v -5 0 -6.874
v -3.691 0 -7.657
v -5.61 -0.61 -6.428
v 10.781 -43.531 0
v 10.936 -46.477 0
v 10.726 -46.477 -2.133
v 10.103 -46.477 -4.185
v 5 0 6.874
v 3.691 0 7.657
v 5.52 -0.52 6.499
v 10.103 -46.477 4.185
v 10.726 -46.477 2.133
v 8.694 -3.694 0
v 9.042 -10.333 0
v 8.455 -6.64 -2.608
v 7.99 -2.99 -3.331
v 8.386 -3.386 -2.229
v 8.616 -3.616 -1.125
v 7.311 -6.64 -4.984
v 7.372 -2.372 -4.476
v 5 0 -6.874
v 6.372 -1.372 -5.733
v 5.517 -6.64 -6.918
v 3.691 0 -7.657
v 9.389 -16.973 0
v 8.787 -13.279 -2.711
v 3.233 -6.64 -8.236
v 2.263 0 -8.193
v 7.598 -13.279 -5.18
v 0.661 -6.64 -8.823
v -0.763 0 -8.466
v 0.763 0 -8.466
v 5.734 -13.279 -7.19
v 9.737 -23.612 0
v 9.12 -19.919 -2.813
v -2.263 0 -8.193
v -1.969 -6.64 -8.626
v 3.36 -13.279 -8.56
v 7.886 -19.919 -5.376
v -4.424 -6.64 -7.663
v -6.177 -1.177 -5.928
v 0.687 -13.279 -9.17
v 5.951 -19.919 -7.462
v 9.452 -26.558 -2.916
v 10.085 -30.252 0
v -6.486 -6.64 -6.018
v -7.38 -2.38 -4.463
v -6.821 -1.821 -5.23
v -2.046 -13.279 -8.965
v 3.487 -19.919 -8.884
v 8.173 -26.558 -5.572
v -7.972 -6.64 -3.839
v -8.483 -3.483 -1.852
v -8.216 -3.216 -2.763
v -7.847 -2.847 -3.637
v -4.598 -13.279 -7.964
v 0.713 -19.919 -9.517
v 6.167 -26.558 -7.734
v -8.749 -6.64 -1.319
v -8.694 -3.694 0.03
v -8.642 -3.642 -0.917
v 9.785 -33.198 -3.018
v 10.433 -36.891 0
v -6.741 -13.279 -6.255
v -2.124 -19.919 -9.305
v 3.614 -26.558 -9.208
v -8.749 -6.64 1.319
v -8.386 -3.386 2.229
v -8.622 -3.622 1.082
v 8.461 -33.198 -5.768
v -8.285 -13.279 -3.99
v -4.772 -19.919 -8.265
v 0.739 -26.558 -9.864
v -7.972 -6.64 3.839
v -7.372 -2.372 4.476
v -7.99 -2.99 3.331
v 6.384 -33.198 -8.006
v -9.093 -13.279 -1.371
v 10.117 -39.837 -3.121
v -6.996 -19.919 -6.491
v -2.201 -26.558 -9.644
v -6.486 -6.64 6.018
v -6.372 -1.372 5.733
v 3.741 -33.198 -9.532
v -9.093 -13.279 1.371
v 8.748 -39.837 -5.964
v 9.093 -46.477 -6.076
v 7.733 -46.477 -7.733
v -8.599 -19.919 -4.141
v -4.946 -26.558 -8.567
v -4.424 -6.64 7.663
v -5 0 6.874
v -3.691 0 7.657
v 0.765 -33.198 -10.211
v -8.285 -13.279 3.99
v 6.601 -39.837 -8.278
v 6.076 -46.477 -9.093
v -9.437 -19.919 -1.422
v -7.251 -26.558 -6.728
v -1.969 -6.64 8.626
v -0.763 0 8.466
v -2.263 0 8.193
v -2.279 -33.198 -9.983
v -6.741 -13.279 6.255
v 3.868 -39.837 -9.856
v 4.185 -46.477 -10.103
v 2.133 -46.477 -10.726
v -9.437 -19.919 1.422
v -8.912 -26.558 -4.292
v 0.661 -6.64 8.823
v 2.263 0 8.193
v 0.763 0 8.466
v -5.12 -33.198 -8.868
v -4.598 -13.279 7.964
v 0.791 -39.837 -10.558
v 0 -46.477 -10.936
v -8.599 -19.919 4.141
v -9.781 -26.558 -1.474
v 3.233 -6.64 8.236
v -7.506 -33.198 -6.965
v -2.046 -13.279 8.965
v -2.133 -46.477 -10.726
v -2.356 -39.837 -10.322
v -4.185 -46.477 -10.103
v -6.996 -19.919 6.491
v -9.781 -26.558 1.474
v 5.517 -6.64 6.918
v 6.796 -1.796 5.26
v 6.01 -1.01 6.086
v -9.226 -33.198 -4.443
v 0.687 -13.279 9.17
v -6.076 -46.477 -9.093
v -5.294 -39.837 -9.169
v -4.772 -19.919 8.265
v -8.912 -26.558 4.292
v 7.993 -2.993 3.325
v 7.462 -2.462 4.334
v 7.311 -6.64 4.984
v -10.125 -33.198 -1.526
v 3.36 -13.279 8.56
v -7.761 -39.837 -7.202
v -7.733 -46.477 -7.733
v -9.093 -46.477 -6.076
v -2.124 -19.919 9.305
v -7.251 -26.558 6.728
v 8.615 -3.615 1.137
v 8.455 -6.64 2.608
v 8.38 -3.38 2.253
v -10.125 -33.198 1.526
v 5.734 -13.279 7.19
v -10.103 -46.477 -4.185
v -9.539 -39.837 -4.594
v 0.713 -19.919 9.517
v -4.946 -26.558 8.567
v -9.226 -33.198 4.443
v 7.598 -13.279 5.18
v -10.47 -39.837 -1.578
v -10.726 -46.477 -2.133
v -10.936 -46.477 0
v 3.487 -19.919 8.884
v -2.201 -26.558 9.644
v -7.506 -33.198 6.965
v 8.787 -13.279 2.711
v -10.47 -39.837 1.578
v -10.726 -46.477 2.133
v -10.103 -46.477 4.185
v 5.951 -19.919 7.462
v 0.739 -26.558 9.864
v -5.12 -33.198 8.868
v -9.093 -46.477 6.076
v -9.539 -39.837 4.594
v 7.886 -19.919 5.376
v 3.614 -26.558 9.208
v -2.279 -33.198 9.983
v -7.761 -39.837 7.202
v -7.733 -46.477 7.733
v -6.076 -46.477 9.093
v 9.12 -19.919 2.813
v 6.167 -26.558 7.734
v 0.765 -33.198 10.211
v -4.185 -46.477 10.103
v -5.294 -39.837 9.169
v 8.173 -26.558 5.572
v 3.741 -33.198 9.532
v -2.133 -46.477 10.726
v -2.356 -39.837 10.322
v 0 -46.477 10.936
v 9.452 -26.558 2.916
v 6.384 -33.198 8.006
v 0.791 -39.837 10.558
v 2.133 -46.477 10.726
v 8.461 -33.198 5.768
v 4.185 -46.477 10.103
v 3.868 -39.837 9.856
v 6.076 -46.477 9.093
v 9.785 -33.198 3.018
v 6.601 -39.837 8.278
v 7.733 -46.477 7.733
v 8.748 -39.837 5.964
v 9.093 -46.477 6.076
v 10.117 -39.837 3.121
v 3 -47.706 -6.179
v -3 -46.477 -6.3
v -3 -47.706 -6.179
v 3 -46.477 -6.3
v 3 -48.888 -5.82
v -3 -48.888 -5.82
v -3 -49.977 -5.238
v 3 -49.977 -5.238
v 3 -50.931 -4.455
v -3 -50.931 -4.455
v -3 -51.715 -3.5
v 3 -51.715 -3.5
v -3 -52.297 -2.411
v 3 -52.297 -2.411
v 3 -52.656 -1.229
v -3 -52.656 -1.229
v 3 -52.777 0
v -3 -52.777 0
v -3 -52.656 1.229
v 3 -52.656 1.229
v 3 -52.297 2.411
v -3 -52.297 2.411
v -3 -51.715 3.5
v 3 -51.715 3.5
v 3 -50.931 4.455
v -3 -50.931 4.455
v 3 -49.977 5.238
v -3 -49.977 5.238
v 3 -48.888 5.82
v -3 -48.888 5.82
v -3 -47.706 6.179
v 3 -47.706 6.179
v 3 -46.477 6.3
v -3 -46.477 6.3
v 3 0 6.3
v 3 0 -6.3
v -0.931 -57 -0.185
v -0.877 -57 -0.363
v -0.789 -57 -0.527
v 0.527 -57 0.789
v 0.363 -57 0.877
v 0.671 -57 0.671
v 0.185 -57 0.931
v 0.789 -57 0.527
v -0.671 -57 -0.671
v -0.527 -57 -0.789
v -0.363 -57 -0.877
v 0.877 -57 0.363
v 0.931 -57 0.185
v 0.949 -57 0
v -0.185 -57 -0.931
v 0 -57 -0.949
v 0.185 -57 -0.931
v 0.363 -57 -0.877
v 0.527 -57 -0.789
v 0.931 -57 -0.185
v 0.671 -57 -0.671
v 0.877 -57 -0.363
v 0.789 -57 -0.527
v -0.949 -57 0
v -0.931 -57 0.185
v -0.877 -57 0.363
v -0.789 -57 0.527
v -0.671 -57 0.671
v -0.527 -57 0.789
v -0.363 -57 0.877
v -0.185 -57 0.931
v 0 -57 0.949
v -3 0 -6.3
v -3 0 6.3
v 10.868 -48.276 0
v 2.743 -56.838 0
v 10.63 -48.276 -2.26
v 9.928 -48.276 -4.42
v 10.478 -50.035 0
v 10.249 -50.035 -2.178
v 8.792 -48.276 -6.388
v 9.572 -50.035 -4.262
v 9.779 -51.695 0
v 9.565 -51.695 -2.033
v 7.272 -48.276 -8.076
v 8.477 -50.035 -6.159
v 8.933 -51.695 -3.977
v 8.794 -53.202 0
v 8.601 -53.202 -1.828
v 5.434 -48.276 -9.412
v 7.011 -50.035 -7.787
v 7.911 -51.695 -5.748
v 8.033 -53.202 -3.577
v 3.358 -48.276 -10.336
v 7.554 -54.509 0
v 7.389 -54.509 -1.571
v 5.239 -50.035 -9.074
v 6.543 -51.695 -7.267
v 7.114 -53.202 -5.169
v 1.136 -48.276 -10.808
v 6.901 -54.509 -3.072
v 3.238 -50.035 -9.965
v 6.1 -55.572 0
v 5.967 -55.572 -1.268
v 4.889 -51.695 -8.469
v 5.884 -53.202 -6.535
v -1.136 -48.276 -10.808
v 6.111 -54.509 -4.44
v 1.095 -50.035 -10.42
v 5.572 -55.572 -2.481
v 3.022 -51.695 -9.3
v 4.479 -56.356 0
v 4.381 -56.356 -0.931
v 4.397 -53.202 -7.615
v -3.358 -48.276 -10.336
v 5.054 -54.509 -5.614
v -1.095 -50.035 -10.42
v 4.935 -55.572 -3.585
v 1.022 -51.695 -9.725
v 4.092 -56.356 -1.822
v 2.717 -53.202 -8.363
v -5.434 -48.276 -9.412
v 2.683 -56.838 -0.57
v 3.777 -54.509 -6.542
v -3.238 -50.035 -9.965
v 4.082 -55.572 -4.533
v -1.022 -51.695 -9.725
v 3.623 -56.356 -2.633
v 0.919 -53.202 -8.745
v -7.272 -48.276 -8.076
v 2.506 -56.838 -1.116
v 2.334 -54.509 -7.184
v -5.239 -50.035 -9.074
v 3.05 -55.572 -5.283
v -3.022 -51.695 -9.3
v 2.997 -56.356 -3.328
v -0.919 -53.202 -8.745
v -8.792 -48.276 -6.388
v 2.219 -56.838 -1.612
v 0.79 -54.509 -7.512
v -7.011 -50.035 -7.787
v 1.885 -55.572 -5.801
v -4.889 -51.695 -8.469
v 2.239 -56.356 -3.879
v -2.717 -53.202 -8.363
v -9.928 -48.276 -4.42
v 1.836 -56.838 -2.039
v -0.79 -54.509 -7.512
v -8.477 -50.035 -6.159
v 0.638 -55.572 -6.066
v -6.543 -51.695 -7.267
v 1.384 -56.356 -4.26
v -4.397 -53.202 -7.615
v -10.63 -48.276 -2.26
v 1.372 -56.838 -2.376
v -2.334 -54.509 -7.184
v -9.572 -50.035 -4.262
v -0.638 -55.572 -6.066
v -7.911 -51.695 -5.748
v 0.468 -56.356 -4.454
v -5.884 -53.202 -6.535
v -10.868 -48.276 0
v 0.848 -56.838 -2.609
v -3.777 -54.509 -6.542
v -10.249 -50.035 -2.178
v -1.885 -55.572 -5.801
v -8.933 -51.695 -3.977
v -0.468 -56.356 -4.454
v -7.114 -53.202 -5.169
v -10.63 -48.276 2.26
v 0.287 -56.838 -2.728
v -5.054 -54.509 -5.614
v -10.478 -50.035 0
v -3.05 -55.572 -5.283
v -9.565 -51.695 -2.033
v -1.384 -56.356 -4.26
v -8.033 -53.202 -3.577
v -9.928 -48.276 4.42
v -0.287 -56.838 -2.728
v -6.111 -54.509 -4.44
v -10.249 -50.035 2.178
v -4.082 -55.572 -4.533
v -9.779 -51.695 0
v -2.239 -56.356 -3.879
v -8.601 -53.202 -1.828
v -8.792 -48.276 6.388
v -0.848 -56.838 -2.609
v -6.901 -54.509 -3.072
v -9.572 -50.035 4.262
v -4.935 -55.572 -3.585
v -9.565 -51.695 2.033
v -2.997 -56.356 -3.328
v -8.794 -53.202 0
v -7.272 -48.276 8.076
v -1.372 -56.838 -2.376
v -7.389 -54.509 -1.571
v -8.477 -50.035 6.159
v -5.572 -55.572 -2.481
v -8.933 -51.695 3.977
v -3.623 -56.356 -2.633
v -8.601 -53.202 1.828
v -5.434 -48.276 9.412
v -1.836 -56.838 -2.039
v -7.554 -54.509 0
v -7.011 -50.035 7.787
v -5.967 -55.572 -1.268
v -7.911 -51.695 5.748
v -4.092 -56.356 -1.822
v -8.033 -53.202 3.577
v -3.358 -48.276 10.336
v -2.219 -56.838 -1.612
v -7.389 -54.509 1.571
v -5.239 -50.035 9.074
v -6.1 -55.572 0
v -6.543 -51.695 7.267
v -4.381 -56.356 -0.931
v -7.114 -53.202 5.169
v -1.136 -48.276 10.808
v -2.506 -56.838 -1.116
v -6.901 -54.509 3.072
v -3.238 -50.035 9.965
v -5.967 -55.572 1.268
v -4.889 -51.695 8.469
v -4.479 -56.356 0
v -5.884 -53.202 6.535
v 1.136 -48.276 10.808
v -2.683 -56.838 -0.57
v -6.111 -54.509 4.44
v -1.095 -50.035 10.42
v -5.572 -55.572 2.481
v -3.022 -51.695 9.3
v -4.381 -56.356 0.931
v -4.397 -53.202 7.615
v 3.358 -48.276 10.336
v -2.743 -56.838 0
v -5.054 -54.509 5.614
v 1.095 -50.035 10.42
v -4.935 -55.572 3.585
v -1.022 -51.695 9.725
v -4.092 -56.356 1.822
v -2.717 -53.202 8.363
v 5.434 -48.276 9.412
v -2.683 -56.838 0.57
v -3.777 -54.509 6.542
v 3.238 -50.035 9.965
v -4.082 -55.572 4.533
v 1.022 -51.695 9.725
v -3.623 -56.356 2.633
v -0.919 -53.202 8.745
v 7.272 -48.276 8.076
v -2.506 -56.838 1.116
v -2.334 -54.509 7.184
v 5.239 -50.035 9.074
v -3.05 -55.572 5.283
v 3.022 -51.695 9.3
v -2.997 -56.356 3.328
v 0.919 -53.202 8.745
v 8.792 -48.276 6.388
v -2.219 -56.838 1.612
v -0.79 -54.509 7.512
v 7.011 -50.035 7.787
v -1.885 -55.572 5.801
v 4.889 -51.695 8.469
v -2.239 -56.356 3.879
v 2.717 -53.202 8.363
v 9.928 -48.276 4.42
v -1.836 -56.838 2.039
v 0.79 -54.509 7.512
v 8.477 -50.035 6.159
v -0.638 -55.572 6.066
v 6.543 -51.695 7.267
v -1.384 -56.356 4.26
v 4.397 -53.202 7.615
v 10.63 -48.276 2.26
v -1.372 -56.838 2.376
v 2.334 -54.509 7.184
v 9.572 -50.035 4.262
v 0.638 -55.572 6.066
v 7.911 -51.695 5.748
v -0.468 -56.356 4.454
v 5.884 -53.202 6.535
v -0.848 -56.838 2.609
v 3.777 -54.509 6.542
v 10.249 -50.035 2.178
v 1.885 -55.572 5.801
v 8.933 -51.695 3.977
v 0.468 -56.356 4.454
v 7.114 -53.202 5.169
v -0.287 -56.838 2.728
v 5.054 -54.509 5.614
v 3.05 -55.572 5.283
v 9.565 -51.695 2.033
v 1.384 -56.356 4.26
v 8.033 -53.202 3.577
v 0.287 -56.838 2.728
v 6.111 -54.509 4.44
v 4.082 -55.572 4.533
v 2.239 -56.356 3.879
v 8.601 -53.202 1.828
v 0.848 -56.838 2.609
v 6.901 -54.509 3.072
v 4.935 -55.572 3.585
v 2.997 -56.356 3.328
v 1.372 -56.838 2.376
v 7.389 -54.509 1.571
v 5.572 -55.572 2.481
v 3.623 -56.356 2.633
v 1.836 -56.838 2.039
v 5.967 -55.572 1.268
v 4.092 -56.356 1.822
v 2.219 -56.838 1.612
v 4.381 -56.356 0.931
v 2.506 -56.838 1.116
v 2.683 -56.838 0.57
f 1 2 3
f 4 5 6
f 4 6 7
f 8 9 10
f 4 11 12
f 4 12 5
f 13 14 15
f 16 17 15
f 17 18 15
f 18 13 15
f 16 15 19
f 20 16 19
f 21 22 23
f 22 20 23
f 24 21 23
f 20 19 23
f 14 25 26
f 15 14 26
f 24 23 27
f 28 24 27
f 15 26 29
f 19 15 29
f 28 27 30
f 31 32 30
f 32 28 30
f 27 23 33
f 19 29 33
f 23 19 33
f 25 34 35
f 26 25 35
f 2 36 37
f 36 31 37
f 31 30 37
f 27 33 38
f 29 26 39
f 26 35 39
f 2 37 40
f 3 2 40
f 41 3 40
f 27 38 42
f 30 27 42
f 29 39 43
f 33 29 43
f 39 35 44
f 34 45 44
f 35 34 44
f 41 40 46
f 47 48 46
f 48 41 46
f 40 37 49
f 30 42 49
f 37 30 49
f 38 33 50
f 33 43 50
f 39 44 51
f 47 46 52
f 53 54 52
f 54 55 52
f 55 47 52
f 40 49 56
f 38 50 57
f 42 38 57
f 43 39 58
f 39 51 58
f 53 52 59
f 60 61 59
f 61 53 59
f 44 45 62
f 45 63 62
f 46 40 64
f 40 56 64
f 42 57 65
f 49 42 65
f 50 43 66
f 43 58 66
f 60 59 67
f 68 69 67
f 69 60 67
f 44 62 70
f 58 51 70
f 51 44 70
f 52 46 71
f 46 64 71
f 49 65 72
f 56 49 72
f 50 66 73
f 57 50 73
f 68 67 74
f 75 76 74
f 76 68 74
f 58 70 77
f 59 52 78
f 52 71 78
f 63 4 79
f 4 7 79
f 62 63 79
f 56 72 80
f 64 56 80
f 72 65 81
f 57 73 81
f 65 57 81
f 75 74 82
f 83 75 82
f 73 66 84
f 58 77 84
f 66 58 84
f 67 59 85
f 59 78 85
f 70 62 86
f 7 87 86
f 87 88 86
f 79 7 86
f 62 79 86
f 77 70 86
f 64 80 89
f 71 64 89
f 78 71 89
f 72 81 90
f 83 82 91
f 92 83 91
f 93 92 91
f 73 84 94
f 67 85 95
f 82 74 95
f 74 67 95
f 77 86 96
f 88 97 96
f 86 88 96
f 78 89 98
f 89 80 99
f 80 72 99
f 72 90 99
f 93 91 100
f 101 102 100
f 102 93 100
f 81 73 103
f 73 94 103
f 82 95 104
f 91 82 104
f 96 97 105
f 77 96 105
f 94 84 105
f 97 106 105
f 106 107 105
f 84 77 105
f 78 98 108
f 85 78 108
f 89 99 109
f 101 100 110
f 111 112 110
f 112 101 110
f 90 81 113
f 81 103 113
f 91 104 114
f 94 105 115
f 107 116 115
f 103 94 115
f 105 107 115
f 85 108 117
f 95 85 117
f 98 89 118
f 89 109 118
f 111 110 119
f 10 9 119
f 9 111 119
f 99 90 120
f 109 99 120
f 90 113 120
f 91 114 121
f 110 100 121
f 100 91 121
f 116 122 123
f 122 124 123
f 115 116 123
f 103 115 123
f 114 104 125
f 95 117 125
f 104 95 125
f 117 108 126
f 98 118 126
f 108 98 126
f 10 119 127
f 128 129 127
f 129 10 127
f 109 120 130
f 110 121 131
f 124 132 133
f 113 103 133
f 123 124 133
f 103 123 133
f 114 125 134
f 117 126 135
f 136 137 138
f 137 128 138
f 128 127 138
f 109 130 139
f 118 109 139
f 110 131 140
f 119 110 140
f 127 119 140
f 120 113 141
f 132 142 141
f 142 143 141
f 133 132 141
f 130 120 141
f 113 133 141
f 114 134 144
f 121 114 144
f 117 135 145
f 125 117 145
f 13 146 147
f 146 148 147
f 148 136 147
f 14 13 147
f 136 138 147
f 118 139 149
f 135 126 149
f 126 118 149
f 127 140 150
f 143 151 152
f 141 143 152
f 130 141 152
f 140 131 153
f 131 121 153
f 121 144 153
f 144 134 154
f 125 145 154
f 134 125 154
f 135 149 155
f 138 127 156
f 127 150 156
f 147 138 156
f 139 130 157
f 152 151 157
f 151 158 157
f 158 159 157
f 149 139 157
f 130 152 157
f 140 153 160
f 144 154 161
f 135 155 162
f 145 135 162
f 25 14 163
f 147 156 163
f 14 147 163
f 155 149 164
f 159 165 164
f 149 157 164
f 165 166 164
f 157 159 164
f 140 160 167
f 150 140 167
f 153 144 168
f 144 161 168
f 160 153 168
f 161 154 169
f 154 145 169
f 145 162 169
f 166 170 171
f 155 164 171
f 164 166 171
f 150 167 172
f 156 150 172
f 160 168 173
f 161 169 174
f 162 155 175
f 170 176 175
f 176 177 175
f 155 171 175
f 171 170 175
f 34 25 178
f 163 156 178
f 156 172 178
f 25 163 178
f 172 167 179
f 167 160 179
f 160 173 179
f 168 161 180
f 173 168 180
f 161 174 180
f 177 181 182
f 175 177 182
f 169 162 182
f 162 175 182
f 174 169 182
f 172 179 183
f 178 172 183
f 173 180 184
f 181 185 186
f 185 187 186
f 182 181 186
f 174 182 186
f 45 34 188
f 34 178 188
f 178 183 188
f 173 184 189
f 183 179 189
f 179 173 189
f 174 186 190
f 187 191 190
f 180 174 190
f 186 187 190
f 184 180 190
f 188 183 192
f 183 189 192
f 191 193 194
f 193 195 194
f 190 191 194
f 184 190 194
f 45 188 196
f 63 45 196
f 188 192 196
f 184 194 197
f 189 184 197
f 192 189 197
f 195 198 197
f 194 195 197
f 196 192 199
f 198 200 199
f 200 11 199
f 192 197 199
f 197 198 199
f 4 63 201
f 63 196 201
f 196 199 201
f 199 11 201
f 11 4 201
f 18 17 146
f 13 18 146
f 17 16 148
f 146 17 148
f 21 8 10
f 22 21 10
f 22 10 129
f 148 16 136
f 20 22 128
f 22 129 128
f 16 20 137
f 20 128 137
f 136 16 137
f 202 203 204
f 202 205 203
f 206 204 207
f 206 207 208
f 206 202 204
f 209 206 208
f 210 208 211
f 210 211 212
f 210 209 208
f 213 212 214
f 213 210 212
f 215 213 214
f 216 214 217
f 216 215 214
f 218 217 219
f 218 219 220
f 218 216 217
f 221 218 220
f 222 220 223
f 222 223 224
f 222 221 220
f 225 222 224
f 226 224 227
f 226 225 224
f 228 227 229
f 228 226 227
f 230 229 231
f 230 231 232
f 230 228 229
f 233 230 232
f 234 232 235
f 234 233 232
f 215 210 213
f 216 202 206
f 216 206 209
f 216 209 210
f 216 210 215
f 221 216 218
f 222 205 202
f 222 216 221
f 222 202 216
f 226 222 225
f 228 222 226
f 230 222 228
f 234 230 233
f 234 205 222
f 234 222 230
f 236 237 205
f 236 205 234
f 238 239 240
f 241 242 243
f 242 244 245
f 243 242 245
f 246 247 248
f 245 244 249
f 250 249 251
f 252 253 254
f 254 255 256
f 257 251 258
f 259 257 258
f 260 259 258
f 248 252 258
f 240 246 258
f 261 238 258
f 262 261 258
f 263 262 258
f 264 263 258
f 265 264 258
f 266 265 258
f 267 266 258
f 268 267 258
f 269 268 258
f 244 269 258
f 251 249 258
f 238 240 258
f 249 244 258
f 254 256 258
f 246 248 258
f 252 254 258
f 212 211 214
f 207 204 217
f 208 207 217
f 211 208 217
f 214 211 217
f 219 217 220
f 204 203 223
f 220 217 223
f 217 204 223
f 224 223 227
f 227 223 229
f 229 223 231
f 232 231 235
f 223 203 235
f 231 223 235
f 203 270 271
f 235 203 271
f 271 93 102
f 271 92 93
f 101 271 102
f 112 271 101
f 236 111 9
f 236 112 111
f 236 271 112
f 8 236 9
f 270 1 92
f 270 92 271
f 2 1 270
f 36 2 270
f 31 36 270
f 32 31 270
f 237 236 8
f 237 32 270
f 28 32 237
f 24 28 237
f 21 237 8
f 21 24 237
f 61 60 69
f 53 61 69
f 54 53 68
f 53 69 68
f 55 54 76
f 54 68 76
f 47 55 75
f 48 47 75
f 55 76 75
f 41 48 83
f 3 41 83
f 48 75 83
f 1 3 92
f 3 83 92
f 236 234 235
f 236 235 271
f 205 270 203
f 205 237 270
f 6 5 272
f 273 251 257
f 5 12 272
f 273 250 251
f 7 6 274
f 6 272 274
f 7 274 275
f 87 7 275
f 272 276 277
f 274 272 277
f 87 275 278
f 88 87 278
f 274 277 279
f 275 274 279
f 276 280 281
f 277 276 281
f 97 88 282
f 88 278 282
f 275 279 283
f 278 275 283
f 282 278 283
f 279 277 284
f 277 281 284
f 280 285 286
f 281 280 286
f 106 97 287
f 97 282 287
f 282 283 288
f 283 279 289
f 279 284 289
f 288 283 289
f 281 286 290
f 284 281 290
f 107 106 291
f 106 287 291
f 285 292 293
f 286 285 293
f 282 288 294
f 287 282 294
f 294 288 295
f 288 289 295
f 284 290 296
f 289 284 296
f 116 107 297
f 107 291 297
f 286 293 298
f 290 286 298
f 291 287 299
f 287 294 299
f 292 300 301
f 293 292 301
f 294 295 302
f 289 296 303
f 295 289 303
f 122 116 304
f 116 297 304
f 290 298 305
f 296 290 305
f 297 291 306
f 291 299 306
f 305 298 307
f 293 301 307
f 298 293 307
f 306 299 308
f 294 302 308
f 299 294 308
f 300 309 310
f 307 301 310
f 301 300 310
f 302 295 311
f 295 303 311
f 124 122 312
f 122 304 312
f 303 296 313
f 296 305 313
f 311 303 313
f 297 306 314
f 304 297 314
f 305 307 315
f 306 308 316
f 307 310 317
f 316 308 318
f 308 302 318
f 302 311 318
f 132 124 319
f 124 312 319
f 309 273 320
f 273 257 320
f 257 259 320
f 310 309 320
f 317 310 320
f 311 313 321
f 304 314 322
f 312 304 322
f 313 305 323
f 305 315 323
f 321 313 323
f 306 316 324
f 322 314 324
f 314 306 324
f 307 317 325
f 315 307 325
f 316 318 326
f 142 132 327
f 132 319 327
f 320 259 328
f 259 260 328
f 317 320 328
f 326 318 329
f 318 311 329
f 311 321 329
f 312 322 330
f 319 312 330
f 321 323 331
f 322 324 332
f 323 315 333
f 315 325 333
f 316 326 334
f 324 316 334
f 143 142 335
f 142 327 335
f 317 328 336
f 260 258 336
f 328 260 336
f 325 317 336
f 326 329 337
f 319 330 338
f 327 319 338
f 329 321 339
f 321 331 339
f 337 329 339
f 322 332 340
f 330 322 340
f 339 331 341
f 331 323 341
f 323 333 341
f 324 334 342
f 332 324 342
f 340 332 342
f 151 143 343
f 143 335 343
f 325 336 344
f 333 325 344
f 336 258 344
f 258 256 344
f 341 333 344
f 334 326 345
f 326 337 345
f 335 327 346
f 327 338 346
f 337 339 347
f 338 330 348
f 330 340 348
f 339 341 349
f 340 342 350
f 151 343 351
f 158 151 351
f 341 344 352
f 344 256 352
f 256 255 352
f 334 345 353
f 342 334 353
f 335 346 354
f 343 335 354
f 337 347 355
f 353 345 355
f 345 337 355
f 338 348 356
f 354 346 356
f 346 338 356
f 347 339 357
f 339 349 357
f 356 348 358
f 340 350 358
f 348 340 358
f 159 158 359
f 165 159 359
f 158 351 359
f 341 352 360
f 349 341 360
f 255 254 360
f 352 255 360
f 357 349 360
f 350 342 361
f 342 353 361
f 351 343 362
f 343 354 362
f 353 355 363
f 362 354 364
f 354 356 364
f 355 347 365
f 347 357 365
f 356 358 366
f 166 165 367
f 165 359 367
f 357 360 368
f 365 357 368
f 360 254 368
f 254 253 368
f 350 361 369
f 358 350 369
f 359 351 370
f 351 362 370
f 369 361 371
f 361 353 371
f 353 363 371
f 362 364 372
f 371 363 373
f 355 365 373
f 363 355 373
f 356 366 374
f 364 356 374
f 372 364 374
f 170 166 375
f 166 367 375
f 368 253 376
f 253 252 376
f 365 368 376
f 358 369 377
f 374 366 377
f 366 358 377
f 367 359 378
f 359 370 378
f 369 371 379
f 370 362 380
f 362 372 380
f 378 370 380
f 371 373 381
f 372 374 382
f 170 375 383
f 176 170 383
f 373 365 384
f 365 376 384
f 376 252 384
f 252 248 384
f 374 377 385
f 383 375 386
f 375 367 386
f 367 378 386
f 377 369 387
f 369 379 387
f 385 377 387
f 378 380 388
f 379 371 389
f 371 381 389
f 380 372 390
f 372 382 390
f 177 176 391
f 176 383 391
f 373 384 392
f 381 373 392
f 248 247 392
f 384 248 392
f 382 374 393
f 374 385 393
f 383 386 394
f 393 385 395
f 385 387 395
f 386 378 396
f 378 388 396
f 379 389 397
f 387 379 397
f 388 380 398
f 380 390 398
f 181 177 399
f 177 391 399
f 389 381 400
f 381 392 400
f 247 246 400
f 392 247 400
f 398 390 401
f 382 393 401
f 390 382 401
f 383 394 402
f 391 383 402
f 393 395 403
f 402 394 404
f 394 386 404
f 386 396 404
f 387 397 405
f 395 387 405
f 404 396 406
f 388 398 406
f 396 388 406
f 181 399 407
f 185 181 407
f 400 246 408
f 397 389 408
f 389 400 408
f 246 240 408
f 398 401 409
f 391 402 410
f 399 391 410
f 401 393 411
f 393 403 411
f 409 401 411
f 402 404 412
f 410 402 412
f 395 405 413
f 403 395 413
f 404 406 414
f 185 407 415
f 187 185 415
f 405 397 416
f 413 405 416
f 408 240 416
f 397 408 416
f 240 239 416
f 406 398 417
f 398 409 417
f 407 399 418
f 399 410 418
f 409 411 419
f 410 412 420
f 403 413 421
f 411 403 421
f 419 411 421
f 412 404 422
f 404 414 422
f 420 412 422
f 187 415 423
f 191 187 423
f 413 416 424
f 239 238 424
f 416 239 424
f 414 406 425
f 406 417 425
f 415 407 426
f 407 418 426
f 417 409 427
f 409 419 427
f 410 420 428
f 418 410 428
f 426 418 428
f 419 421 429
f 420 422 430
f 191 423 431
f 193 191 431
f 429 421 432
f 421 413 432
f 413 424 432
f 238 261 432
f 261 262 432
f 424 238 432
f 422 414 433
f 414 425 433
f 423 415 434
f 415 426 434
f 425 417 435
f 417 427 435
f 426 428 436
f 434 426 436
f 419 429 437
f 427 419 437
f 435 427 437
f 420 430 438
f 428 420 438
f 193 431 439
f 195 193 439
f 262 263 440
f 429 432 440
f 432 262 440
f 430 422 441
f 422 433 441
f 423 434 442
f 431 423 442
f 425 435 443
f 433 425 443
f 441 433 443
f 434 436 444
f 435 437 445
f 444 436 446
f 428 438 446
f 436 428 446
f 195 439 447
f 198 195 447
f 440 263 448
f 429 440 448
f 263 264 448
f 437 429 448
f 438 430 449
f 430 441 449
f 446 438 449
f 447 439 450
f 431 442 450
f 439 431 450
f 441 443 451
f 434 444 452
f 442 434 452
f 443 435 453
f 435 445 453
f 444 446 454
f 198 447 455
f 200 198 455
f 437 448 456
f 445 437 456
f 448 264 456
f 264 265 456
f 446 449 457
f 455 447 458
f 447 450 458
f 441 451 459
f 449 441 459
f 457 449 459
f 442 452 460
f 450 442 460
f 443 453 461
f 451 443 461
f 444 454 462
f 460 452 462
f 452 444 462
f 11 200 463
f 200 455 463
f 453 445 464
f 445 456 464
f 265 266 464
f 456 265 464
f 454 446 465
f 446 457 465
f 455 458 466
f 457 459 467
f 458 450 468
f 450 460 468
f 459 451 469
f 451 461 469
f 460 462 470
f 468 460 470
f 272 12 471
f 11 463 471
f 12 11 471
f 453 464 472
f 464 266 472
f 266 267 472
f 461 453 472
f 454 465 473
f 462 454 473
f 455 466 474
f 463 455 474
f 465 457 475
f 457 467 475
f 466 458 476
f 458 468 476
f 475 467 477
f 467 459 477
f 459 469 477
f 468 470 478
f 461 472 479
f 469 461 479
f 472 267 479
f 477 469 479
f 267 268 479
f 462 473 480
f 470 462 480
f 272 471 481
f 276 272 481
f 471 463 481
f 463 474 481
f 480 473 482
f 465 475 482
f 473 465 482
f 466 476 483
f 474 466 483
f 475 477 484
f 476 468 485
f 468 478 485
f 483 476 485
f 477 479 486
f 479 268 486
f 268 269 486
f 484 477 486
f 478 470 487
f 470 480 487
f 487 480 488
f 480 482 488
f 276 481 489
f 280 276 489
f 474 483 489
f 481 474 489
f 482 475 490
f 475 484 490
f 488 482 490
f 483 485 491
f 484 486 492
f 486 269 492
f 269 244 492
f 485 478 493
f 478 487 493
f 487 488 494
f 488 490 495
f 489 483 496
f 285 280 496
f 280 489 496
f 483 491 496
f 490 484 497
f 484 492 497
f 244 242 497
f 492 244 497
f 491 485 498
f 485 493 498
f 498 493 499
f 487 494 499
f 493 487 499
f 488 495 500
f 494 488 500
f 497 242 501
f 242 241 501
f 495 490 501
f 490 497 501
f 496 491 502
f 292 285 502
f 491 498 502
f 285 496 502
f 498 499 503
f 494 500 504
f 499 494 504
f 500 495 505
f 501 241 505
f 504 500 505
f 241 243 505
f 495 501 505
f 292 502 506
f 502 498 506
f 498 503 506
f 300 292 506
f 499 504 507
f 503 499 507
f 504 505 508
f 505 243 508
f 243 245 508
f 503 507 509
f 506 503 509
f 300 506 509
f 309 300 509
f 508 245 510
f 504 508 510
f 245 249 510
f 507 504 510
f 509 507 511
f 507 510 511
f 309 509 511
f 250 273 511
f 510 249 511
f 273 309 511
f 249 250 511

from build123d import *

# Parameters (mm, degrees)
SKETCH1_R           = 8.5
BOSS_EXTRUDE1_DEPTH = 57
BOSS_EXTRUDE1_TAPER = -3
FILLET1_R           = 10
CUT_EXTRUDE1_DEPTH  = 3
CUT_EXTRUDE2_DEPTH  = 23


with BuildPart() as part:
    # Sketch1 → Boss-Extrude1 (new body)
    with BuildSketch(Plane(origin=(0, 0, 0), x_dir=(1, 0, 0), z_dir=(0, 1, 0))):
        Circle(SKETCH1_R)
    extrude(amount=-BOSS_EXTRUDE1_DEPTH, taper=BOSS_EXTRUDE1_TAPER)

    # Fillet1
    fillet1_edges = [part.edges().sort_by_distance(p)[0] for p in [
        (-11.487243419, -57, 0),
    ]]
    fillet(fillet1_edges, radius=FILLET1_R)

    # Sketch2 → Cut-Extrude1 (cut, symmetric)
    with BuildSketch(Plane(origin=(0, 0, 0), x_dir=(0, 0, -1), z_dir=(1, 0, 0))):
        with BuildLine():
            Line((-6.3, 0), (6.3, 0))
            Line((6.3, 0), (6.3, -46.476640438))
            ThreePointArc((6.3, -46.476640438), (0, -52.776640438), (-6.3, -46.476640438))
            Line((-6.3, -46.476640438), (-6.3, 0))
        make_face()
    extrude(amount=CUT_EXTRUDE1_DEPTH, both=True, mode=Mode.SUBTRACT)

    # Sketch3 → Cut-Extrude2 (cut, symmetric)
    with BuildSketch(Plane.XY):
        Polygon((-5, 0), (5, 0), (10, -5), (10, 5), (-10, 5), (-10, -5), align=None)
    extrude(amount=CUT_EXTRUDE2_DEPTH, both=True, mode=Mode.SUBTRACT)


solid = part.part
